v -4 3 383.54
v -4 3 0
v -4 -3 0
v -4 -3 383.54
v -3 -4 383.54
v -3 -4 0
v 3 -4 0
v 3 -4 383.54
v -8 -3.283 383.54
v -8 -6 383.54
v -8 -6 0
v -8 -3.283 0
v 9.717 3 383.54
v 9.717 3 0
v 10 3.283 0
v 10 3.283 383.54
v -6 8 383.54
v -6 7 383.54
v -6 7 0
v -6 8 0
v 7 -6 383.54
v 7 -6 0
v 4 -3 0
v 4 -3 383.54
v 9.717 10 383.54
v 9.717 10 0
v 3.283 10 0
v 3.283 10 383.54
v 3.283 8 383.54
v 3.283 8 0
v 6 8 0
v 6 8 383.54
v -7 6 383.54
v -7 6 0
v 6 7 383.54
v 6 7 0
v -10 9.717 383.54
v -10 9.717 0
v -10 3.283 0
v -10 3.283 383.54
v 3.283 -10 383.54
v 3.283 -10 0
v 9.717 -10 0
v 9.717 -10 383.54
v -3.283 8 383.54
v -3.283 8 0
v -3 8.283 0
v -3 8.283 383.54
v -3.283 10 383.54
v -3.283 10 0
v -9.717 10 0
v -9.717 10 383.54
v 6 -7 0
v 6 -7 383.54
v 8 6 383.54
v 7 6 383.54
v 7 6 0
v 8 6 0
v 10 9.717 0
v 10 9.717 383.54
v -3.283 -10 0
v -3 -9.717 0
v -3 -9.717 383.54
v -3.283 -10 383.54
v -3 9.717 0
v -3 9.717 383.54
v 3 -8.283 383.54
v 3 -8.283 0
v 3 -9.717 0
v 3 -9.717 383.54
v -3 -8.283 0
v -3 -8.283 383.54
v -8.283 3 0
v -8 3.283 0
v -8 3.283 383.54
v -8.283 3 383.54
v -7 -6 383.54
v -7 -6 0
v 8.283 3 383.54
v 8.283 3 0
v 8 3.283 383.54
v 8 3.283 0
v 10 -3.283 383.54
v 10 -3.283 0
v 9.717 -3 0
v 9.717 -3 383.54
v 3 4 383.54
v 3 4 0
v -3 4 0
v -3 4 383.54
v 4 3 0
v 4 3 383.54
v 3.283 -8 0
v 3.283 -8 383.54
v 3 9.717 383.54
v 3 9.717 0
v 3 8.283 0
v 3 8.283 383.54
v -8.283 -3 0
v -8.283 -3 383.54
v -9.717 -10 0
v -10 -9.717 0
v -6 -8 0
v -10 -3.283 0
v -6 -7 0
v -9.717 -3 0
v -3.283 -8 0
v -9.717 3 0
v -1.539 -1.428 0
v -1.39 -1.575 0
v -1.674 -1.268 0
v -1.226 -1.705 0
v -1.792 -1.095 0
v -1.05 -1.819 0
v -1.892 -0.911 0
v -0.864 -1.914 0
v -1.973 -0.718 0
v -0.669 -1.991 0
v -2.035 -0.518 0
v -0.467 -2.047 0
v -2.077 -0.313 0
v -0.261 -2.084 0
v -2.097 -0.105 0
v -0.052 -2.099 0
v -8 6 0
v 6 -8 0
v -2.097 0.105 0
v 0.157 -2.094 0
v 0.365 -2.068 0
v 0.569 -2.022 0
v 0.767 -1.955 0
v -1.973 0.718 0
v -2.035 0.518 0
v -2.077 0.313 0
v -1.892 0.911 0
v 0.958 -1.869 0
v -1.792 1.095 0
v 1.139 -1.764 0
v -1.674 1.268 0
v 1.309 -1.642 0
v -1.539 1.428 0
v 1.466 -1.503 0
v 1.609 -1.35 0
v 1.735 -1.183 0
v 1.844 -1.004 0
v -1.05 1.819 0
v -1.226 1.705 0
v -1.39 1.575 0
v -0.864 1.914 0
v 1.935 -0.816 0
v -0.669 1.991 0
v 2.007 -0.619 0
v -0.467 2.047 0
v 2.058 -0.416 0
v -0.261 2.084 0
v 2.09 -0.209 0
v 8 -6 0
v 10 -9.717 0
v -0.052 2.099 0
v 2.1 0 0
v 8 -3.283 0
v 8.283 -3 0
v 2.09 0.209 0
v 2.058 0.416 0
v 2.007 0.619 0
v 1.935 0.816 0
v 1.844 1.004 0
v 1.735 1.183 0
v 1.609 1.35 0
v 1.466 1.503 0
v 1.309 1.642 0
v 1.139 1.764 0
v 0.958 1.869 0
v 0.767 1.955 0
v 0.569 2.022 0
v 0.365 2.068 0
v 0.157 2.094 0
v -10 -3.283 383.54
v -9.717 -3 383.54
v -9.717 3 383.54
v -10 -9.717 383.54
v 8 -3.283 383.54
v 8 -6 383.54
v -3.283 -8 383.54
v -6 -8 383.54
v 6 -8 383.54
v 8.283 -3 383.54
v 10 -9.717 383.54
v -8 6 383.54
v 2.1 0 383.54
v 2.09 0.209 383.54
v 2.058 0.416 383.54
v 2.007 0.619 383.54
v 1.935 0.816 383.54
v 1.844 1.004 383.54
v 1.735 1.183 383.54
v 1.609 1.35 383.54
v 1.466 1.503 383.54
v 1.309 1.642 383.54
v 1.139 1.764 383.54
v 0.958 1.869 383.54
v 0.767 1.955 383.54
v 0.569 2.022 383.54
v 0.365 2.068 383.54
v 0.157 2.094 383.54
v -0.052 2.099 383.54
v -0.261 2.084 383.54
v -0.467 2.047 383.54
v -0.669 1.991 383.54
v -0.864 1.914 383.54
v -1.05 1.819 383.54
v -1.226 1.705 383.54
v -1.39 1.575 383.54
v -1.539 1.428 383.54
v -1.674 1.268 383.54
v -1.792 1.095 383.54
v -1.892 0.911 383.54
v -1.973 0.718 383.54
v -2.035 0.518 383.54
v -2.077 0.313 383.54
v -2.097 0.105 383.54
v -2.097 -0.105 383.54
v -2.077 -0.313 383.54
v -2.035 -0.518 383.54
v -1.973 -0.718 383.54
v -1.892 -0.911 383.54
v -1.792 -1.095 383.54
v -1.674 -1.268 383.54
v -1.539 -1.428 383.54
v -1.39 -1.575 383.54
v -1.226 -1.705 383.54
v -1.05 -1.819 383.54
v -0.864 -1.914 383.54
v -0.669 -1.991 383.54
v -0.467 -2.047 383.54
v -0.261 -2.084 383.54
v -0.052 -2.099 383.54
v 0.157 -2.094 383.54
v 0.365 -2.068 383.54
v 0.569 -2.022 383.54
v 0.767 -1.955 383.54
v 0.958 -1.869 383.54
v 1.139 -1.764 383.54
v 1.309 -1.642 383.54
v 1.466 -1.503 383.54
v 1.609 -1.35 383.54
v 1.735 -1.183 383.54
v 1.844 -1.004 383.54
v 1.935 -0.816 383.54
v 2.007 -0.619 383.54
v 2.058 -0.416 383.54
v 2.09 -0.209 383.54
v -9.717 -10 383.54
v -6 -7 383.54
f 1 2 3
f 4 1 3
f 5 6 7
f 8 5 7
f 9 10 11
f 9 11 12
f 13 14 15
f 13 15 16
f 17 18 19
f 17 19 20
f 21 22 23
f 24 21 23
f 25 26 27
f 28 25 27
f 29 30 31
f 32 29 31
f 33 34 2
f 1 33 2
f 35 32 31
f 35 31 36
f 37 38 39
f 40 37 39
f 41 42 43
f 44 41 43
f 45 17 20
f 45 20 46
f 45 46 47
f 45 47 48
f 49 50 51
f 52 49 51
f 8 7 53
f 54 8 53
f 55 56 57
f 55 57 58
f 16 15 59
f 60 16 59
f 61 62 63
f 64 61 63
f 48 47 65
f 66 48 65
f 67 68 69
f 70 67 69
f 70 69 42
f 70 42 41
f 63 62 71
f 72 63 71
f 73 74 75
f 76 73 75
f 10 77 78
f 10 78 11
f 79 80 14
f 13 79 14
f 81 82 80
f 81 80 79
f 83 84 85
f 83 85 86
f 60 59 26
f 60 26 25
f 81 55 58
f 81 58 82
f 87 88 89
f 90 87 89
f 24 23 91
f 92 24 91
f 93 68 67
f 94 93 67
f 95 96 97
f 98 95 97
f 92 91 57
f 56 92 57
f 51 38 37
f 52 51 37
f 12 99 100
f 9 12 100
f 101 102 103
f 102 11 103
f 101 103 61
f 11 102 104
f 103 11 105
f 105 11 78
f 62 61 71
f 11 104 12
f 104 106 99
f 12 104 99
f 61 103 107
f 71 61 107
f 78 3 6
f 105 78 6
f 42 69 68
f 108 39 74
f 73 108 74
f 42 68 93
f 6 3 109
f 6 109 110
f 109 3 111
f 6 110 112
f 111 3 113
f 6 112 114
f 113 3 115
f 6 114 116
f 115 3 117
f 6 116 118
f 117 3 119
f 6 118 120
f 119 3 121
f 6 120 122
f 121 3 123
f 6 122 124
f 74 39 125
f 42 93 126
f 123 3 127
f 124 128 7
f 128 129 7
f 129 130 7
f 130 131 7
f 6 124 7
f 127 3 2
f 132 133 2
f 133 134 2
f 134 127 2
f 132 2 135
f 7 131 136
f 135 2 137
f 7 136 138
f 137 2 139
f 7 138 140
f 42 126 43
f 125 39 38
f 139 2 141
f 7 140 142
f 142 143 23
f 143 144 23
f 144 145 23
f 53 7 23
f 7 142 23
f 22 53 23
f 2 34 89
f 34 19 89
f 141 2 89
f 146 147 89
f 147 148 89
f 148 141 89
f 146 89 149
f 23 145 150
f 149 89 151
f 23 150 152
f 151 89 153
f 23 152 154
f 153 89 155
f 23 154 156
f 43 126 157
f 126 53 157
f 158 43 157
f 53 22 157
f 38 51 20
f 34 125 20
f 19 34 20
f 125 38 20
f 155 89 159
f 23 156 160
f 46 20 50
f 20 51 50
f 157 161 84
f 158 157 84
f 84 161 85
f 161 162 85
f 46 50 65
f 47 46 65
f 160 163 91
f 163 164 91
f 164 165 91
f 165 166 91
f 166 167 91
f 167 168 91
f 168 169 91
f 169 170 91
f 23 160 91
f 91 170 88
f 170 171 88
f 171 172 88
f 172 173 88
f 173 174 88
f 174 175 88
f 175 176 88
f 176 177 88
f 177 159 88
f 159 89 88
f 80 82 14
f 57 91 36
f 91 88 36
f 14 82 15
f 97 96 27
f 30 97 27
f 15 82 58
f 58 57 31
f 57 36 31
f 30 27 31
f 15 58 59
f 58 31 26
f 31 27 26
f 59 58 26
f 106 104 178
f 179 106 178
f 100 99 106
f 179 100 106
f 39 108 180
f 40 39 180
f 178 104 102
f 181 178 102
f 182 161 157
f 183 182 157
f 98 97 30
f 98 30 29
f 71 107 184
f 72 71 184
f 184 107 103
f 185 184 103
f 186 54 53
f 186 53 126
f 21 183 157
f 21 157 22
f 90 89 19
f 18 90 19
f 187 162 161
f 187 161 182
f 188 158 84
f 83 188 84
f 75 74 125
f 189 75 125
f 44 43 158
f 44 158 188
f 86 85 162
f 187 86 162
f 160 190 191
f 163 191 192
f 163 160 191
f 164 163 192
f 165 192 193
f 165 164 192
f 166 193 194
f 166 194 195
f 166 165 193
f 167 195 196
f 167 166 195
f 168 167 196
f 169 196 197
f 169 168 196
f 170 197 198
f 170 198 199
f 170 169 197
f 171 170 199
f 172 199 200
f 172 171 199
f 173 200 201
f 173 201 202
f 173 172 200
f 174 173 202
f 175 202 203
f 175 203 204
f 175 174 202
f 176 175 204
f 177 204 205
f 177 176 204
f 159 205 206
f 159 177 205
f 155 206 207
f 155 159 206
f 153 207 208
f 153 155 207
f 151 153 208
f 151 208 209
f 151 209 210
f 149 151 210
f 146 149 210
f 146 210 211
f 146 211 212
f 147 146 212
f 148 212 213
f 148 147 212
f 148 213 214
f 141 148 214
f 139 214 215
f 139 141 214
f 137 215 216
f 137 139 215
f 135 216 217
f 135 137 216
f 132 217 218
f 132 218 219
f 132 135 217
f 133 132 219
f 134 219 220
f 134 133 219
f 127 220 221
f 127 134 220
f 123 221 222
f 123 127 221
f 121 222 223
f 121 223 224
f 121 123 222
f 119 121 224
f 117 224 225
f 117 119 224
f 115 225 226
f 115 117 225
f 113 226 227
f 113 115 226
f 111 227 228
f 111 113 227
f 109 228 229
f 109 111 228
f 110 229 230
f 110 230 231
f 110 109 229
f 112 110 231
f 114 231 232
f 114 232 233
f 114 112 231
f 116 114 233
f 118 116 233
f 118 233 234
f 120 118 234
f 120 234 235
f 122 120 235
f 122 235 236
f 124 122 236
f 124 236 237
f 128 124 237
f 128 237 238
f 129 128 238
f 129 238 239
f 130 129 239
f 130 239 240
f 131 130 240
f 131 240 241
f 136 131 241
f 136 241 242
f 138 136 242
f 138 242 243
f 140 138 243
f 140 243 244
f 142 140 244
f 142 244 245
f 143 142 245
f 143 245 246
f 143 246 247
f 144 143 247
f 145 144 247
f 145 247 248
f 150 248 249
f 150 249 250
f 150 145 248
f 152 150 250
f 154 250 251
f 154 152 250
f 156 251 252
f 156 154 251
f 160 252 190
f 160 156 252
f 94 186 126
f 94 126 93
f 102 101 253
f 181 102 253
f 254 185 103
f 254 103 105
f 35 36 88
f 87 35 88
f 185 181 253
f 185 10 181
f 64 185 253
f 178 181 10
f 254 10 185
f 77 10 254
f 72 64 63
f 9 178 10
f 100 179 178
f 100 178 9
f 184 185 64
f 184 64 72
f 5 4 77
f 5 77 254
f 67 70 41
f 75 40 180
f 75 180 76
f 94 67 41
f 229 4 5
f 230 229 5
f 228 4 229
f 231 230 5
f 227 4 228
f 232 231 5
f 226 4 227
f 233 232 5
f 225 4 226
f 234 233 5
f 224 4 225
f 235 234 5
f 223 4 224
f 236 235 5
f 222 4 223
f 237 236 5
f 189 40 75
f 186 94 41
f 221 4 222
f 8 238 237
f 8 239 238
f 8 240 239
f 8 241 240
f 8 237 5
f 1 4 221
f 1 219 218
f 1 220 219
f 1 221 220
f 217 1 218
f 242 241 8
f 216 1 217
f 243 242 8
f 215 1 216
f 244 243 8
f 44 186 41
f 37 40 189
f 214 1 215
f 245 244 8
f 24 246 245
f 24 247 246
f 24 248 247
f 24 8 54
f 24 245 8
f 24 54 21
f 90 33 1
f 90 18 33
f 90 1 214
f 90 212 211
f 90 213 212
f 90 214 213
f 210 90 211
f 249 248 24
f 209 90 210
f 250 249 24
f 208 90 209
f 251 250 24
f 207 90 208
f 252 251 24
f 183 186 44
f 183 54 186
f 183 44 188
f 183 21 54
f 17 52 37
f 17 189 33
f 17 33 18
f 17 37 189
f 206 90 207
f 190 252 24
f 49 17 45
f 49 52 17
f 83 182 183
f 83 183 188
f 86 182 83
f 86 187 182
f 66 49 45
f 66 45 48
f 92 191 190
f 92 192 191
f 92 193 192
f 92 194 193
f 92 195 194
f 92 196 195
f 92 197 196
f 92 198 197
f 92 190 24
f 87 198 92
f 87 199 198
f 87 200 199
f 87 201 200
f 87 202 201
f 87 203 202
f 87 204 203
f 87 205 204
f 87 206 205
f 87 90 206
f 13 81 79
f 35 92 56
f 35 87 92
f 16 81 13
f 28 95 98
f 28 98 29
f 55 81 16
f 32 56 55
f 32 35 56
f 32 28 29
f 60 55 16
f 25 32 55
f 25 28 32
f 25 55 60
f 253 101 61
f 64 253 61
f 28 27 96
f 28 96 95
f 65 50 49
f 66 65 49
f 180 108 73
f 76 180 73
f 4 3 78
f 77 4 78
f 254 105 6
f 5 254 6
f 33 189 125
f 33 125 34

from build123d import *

# Parameters (mm, degrees)
SKETCH1_R           = 2.1
BOSS_EXTRUDE1_DEPTH = 383.54
CHAMFER1_SIZE       = 0.2828


with BuildPart() as part:
    # Sketch1 → Boss-Extrude1 (new body)
    with BuildSketch(Plane.XY):
        Polygon((-3, 8), (-3, 10), (-10, 10), (-10, 3), (-8, 3), (-8, 6), (-7, 6), (-4, 3), (-4, -3), (-7, -6), (-8, -6), (-8, -3), (-10, -3), (-10, -10), (-3, -10), (-3, -8), (-6, -8), (-6, -7), (-3, -4), (3, -4), (6, -7), (6, -8), (3, -8), (3, -10), (10, -10), (10, -3), (8, -3), (8, -6), (7, -6), (4, -3), (4, 3), (7, 6), (8, 6), (8, 3), (10, 3), (10, 10), (3, 10), (3, 8), (6, 8), (6, 7), (3, 4), (-3, 4), (-6, 7), (-6, 8), align=None)
        Circle(SKETCH1_R, mode=Mode.SUBTRACT)
    extrude(amount=BOSS_EXTRUDE1_DEPTH)

    # Chamfer1
    chamfer1_edges = [part.edges().sort_by_distance(p)[0] for p in [
        (-8, -3, 191.77),
        (-8, 3, 191.77),
        (-10, 3, 191.77),
        (-10, 10, 191.77),
        (-3, 10, 191.77),
        (-3, 8, 191.77),
        (3, 8, 191.77),
        (3, 10, 191.77),
        (10, 10, 191.77),
        (10, 3, 191.77),
        (8, 3, 191.77),
        (8, -3, 191.77),
        (10, -3, 191.77),
        (10, -10, 191.77),
        (3, -10, 191.77),
        (3, -8, 191.77),
        (-3, -8, 191.77),
        (-3, -10, 191.77),
        (-10, -10, 191.77),
        (-10, -3, 191.77),
    ]]
    chamfer(chamfer1_edges, length=CHAMFER1_SIZE)


solid = part.part
